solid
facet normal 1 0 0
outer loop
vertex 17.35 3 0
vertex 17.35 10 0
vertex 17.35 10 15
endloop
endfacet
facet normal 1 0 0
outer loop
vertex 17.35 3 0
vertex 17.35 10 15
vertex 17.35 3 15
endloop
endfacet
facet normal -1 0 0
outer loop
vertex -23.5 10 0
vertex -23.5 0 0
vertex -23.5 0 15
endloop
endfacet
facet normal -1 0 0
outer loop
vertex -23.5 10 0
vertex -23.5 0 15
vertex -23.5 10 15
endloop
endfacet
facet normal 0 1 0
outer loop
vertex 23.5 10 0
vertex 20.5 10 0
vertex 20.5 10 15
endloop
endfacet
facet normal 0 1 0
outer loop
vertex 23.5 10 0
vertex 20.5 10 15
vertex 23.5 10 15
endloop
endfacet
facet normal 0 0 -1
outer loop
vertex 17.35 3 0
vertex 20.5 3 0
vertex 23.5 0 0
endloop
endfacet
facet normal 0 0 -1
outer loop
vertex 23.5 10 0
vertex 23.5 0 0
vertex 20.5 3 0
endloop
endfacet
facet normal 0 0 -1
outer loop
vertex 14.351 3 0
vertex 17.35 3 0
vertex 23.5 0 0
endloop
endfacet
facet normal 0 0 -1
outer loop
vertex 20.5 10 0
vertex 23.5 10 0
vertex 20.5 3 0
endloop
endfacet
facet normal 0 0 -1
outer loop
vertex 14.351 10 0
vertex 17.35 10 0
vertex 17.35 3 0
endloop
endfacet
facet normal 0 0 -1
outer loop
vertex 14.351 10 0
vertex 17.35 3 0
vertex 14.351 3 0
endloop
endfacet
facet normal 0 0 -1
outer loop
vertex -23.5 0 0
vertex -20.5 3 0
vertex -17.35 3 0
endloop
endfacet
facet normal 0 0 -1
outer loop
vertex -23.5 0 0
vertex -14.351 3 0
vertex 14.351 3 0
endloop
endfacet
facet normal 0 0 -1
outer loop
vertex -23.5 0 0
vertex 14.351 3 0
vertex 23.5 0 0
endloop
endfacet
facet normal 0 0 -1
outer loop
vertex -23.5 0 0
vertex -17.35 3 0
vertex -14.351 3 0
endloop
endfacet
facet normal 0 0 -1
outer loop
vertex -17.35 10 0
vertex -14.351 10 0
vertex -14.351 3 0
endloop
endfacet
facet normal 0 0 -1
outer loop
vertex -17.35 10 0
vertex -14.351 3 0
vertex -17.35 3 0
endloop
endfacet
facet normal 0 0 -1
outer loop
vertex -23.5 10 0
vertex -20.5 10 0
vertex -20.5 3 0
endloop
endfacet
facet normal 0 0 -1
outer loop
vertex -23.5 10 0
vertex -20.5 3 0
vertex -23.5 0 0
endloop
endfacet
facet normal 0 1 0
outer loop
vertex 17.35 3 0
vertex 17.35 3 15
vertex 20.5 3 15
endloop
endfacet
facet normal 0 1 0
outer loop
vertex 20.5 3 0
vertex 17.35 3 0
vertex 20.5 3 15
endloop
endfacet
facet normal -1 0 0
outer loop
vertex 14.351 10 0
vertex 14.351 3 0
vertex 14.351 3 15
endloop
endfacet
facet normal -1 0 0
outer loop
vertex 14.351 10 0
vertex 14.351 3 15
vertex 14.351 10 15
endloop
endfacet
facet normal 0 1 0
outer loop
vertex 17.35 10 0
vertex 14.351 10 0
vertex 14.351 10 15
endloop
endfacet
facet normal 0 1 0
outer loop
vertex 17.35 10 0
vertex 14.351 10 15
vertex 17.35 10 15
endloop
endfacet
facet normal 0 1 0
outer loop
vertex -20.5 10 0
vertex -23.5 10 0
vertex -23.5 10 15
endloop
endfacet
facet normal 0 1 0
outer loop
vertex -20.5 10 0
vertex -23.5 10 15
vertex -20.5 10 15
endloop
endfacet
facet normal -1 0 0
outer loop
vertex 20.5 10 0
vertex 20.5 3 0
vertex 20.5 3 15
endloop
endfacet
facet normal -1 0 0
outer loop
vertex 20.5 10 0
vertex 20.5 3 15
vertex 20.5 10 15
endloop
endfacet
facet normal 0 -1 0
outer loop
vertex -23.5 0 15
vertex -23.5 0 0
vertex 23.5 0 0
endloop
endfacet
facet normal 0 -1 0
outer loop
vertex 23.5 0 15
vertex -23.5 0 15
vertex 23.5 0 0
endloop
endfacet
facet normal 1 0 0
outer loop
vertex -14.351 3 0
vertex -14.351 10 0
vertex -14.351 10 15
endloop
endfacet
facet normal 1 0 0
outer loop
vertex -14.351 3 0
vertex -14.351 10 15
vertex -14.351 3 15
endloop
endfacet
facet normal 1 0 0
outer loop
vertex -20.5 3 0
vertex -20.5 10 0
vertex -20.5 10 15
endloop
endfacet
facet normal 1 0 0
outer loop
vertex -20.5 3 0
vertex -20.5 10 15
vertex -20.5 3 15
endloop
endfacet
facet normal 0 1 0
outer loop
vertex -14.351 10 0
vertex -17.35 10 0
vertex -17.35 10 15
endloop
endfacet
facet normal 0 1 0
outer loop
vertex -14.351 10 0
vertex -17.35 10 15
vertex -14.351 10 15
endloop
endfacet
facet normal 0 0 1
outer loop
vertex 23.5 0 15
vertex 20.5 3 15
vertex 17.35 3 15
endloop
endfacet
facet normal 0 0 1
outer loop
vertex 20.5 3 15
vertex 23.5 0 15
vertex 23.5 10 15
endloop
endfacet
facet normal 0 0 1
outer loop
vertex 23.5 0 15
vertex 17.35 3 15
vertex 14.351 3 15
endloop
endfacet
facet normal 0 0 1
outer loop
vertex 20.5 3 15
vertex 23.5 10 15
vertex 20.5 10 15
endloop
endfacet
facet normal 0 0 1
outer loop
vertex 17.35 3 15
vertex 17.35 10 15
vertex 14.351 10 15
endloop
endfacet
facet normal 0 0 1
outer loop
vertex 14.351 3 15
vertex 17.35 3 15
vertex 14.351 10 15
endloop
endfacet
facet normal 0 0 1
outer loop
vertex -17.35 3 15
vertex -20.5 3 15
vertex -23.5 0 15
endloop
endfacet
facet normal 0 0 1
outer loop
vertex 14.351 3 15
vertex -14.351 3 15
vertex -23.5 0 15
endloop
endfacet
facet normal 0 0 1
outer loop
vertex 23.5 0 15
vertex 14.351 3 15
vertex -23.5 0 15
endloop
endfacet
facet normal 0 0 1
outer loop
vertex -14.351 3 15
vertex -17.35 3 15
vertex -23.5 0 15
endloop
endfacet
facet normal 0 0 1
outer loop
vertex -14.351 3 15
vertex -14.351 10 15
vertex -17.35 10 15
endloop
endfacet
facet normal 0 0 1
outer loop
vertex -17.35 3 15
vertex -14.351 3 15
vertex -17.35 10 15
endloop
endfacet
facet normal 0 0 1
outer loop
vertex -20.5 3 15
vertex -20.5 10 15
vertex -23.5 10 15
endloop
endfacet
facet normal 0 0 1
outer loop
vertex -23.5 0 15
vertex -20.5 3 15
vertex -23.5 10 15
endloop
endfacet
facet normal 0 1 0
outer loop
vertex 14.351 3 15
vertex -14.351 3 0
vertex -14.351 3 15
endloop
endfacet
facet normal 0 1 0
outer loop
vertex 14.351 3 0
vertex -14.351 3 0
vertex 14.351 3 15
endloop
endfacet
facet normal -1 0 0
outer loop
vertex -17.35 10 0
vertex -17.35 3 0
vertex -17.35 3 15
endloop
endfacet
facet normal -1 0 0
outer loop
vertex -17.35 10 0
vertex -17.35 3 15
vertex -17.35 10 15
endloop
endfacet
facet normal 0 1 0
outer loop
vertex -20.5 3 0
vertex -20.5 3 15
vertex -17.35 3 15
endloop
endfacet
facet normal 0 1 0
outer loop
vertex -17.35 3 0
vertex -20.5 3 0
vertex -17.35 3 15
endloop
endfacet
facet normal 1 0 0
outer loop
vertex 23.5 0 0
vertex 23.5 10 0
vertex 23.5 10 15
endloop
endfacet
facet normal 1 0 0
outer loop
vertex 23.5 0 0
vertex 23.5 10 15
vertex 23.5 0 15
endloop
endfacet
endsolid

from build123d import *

# Parameters (mm, degrees)
DODANIE_WYCI_GNI_CIE1_DEPTH = 15


with BuildPart() as part:
    # Szkic1 → Dodanie-wyciągnięcie1 (new body)
    with BuildSketch(Plane.XY):
        Polygon((20.5, 0), (-20.5, 0), (-23.5, 0), (-23.5, 10), (-20.5, 10), (-20.5, 3), (-17.35, 3), (-17.35, 10), (-14.351157044, 10), (-14.351157044, 3), (14.351157044, 3), (14.351157044, 10), (17.35, 10), (17.35, 3), (20.5, 3), (20.5, 10), (23.5, 10), (23.5, 0), align=None)
    extrude(amount=DODANIE_WYCI_GNI_CIE1_DEPTH)


solid = part.part
